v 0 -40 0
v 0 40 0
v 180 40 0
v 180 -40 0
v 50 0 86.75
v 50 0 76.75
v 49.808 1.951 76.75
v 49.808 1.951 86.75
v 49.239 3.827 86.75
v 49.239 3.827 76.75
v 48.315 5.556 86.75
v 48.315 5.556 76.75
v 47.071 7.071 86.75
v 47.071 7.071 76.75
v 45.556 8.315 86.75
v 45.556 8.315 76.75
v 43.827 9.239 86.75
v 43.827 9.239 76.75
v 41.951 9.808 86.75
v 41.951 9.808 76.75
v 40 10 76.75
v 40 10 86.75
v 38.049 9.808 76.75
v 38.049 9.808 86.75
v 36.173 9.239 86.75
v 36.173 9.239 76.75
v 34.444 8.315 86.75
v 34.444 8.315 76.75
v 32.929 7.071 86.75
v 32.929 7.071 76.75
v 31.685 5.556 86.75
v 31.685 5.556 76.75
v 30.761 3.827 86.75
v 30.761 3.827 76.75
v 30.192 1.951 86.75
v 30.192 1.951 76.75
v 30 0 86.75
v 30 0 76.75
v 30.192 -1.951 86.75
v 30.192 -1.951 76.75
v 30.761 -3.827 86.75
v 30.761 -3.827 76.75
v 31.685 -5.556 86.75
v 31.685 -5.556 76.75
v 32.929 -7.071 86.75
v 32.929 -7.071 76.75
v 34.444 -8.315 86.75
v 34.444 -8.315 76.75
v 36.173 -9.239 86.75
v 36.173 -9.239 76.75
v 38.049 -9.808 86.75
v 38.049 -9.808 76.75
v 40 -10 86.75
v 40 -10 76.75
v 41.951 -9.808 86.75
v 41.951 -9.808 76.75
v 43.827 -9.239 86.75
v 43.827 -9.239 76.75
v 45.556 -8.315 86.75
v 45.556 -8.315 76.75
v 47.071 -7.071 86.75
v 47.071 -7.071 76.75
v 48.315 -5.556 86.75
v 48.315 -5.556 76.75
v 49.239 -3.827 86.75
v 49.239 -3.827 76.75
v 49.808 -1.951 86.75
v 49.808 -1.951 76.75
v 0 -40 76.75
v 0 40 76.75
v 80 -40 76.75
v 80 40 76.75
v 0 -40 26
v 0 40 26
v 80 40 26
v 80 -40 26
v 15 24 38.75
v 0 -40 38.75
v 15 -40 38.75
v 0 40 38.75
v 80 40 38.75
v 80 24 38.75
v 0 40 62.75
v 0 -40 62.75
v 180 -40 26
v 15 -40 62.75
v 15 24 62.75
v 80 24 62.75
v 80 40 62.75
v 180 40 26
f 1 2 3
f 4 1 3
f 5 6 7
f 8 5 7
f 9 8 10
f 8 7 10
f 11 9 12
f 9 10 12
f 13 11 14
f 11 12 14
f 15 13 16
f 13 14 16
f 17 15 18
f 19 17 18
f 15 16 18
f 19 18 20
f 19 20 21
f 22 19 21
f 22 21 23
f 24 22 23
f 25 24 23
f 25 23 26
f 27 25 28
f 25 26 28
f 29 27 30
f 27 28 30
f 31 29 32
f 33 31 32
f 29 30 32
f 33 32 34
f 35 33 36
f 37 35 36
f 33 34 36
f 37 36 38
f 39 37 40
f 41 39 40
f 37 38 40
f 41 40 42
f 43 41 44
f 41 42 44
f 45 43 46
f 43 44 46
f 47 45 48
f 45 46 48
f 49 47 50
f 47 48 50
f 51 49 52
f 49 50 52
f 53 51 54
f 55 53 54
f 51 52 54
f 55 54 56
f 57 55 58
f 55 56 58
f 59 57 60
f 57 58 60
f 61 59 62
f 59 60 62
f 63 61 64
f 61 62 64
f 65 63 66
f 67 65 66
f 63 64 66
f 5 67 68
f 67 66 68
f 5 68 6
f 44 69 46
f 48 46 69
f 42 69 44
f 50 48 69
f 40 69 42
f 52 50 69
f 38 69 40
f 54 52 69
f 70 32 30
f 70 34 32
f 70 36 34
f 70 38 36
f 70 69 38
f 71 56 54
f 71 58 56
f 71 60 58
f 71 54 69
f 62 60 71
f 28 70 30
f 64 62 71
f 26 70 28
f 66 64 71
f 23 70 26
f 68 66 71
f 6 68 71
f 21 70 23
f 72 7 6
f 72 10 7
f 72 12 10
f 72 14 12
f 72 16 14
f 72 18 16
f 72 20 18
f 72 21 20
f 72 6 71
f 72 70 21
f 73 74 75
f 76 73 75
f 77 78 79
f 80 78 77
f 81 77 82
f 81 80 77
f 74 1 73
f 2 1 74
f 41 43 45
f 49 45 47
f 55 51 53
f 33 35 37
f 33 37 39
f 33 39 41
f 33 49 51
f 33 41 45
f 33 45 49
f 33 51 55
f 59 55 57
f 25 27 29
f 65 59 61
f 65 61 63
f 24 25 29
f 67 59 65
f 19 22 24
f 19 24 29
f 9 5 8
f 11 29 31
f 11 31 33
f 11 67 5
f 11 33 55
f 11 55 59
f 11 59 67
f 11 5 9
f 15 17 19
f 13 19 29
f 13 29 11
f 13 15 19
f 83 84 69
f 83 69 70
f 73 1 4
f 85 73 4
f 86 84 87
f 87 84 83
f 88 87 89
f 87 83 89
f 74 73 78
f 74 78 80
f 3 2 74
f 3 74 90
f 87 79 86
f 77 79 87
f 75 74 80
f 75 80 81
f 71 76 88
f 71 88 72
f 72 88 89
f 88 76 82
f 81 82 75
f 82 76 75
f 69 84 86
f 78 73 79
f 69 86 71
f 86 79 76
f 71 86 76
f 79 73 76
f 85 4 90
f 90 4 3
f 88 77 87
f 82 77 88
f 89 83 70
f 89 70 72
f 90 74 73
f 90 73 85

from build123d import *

# Parameters (mm, degrees)
SKETCH_W     = 180
SKETCH_H     = 80
PAD_DEPTH    = 26
SKETCH001_W  = 80
SKETCH001_H  = 80
PAD001_DEPTH = 12.75
SKETCH002_W  = 65
SKETCH002_H  = 64
PAD002_DEPTH = 24
SKETCH003_W  = 80
SKETCH003_H  = 80
PAD003_DEPTH = 14
SKETCH004_R  = 10
PAD004_DEPTH = 10


with BuildPart() as base:
    # Sketch → Pad (new body)
    with BuildSketch(Plane.XY):
        with Locations((90, 0)):
            Rectangle(SKETCH_W, SKETCH_H)
    extrude(amount=PAD_DEPTH)


with BuildPart() as toolholder:
    # Sketch001 → Pad001 (new body)
    with BuildSketch(Plane.XY.offset(26)):
        with Locations((40, 0)):
            Rectangle(SKETCH001_W, SKETCH001_H)
    extrude(amount=PAD001_DEPTH)

    # Sketch002 (on Face6 of Pad001) → Pad002 (join)
    with BuildSketch(Plane.XY.offset(38.75)):
        with Locations((47.5, -8)):
            Rectangle(SKETCH002_W, SKETCH002_H)
    extrude(amount=PAD002_DEPTH)

    # Sketch003 (on Face11 of Pad002) → Pad003 (join)
    with BuildSketch(Plane.XY.offset(62.75)):
        with Locations((40, 0)):
            Rectangle(SKETCH003_W, SKETCH003_H)
    extrude(amount=PAD003_DEPTH)

    # Sketch004 (on Face15 of Pad003) → Pad004 (join)
    with BuildSketch(Plane.XY.offset(76.75)):
        with Locations((40, 0)):
            Circle(SKETCH004_R)
    extrude(amount=PAD004_DEPTH)


solid = Compound([base.part, toolholder.part])
